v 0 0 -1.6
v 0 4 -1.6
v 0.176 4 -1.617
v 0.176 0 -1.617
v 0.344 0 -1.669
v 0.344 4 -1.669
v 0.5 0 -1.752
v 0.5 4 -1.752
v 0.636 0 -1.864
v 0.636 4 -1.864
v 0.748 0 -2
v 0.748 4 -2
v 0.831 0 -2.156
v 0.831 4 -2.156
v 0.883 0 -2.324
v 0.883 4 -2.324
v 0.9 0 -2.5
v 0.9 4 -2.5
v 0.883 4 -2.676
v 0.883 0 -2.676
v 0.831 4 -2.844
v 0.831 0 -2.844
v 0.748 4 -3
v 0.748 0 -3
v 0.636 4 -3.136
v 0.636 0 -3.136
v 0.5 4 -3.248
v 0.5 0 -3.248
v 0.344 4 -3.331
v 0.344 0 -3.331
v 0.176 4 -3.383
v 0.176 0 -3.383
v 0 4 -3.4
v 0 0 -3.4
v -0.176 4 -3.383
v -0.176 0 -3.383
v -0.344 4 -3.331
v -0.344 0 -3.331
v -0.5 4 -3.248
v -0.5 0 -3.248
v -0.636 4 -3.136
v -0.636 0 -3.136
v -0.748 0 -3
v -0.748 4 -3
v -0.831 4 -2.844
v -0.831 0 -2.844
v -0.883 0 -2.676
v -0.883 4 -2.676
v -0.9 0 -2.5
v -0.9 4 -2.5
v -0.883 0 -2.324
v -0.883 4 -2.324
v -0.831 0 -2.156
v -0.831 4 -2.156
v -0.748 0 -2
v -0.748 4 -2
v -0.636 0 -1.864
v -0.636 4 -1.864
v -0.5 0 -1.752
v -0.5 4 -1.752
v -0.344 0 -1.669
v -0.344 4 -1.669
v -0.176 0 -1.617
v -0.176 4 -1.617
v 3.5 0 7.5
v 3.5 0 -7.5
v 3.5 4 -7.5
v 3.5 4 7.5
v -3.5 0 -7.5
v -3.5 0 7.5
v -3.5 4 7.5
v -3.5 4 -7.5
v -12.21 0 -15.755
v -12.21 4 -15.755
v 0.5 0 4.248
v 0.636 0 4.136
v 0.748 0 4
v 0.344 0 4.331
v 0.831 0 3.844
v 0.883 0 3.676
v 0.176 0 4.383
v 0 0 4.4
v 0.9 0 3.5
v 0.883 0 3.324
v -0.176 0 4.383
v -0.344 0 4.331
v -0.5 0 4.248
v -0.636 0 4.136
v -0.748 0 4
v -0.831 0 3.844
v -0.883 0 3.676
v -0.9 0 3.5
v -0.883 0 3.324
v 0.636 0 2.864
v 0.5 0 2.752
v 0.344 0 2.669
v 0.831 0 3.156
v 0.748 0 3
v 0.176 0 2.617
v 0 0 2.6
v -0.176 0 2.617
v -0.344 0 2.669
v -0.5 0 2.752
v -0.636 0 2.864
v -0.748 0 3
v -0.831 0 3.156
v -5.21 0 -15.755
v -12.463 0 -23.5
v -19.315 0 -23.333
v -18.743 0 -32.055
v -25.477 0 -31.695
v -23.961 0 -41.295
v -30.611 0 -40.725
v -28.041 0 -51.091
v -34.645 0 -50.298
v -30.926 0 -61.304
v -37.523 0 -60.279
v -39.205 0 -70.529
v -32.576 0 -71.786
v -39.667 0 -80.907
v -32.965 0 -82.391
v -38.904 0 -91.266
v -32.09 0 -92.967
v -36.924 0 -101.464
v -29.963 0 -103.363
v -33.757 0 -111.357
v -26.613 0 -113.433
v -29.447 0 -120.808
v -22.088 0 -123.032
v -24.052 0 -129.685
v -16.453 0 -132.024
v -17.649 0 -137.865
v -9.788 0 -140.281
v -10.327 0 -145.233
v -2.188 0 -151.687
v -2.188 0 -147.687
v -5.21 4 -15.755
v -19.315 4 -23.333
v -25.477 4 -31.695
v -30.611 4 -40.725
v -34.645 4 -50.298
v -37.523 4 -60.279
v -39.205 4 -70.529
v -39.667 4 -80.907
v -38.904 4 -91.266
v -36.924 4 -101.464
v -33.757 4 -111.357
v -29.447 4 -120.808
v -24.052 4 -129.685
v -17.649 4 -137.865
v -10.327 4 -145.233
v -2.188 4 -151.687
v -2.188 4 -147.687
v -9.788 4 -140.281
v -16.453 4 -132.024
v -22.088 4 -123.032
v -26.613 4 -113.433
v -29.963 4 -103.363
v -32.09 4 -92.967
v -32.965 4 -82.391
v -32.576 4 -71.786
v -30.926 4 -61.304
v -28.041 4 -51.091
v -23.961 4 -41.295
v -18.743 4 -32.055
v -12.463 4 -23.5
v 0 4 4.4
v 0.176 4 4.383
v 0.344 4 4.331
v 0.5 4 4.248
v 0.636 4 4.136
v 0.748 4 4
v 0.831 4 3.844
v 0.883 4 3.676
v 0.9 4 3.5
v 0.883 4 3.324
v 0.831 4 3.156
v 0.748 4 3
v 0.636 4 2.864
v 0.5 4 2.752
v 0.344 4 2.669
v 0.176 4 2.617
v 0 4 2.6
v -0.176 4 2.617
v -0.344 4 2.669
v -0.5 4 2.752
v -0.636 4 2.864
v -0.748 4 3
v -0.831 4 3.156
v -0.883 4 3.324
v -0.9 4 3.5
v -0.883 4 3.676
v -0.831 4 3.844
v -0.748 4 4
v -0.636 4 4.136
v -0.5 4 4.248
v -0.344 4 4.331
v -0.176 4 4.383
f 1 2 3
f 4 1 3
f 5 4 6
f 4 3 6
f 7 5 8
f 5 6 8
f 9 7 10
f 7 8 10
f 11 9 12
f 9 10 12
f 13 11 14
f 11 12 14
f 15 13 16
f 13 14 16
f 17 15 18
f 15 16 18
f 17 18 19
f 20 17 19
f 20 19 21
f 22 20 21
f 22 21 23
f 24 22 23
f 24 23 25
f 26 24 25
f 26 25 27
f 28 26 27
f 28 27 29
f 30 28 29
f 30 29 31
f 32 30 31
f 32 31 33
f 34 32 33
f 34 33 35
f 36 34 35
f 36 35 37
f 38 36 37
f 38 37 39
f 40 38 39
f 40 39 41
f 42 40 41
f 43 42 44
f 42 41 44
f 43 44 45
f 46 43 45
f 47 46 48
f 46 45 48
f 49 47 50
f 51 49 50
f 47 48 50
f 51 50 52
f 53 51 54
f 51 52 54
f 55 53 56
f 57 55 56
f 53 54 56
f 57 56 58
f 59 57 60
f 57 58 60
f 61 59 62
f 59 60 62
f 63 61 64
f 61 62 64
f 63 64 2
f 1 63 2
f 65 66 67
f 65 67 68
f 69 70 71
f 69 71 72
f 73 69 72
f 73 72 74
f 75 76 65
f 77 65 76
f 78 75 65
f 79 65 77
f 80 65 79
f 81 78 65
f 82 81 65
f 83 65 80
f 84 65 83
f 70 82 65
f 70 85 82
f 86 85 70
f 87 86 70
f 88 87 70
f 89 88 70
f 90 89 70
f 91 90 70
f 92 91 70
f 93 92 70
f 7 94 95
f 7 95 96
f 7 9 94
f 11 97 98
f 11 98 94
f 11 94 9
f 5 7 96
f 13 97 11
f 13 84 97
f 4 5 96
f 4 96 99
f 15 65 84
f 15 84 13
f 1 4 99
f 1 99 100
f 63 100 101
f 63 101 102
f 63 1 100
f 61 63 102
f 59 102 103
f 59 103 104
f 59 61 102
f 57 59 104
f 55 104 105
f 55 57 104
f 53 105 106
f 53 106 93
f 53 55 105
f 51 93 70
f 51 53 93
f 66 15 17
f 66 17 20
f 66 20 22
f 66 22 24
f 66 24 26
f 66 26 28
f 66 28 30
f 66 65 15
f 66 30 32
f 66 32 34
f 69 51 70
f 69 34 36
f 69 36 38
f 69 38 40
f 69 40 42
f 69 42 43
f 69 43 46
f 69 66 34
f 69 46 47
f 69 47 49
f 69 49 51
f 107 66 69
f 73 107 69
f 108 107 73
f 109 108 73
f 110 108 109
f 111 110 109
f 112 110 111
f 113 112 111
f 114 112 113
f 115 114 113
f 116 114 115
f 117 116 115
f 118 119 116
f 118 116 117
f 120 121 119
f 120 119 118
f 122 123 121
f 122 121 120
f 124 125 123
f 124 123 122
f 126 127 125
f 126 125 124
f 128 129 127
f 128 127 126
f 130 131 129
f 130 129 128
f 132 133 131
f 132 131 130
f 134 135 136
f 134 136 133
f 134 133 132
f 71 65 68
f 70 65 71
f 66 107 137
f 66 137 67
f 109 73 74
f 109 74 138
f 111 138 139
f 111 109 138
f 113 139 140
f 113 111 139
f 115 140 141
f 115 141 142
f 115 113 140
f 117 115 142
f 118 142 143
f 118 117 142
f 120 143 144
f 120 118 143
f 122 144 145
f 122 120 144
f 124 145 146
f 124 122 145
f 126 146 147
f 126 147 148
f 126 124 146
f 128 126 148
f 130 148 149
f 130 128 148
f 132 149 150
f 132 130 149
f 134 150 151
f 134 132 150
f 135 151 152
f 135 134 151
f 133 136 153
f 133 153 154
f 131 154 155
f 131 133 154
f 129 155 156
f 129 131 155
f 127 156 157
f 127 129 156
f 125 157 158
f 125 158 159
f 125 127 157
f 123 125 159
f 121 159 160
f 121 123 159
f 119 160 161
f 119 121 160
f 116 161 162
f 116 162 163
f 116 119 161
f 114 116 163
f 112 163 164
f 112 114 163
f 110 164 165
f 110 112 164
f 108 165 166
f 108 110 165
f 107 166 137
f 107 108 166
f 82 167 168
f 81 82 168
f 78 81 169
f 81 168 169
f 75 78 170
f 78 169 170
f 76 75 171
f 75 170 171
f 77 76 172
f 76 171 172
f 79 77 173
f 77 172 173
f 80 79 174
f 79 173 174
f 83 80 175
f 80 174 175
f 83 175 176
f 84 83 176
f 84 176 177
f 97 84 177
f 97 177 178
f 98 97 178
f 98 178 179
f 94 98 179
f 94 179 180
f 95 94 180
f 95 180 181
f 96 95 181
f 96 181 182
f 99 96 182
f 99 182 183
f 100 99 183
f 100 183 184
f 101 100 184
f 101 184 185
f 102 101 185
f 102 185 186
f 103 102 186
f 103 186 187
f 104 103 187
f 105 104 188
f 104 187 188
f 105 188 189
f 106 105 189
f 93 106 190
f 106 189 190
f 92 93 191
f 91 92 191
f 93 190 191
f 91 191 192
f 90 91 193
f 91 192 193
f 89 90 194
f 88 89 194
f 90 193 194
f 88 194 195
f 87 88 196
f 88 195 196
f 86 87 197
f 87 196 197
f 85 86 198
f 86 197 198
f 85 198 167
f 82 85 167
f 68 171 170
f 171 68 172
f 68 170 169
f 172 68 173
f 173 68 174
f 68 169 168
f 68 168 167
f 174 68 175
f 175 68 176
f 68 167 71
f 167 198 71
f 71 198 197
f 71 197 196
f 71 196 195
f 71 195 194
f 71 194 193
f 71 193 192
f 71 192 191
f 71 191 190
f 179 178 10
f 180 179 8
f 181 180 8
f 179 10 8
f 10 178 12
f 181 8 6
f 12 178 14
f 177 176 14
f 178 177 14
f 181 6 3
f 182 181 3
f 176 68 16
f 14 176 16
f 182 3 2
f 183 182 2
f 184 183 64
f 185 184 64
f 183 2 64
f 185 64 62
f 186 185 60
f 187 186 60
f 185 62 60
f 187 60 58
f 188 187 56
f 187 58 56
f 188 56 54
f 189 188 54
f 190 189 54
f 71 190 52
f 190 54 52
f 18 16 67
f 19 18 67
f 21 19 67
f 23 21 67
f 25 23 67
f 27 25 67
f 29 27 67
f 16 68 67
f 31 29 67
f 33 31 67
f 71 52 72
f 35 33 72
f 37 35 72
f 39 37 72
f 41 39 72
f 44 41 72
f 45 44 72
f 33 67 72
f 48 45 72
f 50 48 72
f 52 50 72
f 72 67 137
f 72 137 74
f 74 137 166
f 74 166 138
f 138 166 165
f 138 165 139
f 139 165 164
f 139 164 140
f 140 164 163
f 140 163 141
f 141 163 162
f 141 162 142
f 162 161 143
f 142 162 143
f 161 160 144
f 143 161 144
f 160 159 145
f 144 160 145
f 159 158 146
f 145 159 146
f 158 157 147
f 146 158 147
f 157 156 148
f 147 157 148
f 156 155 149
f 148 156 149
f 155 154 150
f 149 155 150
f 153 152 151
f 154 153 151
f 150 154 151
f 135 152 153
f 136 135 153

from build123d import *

# Parameters (mm, degrees)
EXTRUDE_1_DEPTH     = 4
SKETCH_5_R          = 0.9
CUT_EXTRUDE_1_DEPTH = 10


with BuildPart() as part:
    # 草图1 → 凸台-拉伸1 (new body)
    with BuildSketch(Plane(origin=(0, 0, 0), x_dir=(1, 0, 0), z_dir=(0, 1, 0))):
        with BuildLine():
            Line((3.5, 7.5), (3.5, -7.5))
            Line((3.5, -7.5), (-3.5, -7.5))
            Line((-3.5, -7.5), (-3.5, 7.5))
            Line((-3.5, 7.5), (-12.209915195, 15.754536771))
            ThreePointArc((-12.209915195, 15.754536771), (-39.438437854, 86.09778223), (-2.187829675, 151.687086375))
            Line((-2.187829675, 151.687086375), (-2.187829675, 147.687086375))
            ThreePointArc((-2.187829675, 147.687086375), (-32.965427594, 82.391199834), (-5.209915195, 15.754536771))
            Line((-5.209915195, 15.754536771), (3.5, 7.5))
        make_face()
    extrude(amount=EXTRUDE_1_DEPTH)

    # 草图5 → 切除-拉伸1 (cut)
    with BuildSketch(Plane(origin=(0, 4, 0), x_dir=(1, 0, 0), z_dir=(0, 1, 0))):
        with Locations(Location((0, -3.5, 0), (0, 0, 270))):
            Circle(SKETCH_5_R)
        with Locations(Location((0, 2.5, 0), (0, 0, 270))):
            Circle(SKETCH_5_R)
    extrude(amount=-CUT_EXTRUDE_1_DEPTH, mode=Mode.SUBTRACT)


solid = part.part
